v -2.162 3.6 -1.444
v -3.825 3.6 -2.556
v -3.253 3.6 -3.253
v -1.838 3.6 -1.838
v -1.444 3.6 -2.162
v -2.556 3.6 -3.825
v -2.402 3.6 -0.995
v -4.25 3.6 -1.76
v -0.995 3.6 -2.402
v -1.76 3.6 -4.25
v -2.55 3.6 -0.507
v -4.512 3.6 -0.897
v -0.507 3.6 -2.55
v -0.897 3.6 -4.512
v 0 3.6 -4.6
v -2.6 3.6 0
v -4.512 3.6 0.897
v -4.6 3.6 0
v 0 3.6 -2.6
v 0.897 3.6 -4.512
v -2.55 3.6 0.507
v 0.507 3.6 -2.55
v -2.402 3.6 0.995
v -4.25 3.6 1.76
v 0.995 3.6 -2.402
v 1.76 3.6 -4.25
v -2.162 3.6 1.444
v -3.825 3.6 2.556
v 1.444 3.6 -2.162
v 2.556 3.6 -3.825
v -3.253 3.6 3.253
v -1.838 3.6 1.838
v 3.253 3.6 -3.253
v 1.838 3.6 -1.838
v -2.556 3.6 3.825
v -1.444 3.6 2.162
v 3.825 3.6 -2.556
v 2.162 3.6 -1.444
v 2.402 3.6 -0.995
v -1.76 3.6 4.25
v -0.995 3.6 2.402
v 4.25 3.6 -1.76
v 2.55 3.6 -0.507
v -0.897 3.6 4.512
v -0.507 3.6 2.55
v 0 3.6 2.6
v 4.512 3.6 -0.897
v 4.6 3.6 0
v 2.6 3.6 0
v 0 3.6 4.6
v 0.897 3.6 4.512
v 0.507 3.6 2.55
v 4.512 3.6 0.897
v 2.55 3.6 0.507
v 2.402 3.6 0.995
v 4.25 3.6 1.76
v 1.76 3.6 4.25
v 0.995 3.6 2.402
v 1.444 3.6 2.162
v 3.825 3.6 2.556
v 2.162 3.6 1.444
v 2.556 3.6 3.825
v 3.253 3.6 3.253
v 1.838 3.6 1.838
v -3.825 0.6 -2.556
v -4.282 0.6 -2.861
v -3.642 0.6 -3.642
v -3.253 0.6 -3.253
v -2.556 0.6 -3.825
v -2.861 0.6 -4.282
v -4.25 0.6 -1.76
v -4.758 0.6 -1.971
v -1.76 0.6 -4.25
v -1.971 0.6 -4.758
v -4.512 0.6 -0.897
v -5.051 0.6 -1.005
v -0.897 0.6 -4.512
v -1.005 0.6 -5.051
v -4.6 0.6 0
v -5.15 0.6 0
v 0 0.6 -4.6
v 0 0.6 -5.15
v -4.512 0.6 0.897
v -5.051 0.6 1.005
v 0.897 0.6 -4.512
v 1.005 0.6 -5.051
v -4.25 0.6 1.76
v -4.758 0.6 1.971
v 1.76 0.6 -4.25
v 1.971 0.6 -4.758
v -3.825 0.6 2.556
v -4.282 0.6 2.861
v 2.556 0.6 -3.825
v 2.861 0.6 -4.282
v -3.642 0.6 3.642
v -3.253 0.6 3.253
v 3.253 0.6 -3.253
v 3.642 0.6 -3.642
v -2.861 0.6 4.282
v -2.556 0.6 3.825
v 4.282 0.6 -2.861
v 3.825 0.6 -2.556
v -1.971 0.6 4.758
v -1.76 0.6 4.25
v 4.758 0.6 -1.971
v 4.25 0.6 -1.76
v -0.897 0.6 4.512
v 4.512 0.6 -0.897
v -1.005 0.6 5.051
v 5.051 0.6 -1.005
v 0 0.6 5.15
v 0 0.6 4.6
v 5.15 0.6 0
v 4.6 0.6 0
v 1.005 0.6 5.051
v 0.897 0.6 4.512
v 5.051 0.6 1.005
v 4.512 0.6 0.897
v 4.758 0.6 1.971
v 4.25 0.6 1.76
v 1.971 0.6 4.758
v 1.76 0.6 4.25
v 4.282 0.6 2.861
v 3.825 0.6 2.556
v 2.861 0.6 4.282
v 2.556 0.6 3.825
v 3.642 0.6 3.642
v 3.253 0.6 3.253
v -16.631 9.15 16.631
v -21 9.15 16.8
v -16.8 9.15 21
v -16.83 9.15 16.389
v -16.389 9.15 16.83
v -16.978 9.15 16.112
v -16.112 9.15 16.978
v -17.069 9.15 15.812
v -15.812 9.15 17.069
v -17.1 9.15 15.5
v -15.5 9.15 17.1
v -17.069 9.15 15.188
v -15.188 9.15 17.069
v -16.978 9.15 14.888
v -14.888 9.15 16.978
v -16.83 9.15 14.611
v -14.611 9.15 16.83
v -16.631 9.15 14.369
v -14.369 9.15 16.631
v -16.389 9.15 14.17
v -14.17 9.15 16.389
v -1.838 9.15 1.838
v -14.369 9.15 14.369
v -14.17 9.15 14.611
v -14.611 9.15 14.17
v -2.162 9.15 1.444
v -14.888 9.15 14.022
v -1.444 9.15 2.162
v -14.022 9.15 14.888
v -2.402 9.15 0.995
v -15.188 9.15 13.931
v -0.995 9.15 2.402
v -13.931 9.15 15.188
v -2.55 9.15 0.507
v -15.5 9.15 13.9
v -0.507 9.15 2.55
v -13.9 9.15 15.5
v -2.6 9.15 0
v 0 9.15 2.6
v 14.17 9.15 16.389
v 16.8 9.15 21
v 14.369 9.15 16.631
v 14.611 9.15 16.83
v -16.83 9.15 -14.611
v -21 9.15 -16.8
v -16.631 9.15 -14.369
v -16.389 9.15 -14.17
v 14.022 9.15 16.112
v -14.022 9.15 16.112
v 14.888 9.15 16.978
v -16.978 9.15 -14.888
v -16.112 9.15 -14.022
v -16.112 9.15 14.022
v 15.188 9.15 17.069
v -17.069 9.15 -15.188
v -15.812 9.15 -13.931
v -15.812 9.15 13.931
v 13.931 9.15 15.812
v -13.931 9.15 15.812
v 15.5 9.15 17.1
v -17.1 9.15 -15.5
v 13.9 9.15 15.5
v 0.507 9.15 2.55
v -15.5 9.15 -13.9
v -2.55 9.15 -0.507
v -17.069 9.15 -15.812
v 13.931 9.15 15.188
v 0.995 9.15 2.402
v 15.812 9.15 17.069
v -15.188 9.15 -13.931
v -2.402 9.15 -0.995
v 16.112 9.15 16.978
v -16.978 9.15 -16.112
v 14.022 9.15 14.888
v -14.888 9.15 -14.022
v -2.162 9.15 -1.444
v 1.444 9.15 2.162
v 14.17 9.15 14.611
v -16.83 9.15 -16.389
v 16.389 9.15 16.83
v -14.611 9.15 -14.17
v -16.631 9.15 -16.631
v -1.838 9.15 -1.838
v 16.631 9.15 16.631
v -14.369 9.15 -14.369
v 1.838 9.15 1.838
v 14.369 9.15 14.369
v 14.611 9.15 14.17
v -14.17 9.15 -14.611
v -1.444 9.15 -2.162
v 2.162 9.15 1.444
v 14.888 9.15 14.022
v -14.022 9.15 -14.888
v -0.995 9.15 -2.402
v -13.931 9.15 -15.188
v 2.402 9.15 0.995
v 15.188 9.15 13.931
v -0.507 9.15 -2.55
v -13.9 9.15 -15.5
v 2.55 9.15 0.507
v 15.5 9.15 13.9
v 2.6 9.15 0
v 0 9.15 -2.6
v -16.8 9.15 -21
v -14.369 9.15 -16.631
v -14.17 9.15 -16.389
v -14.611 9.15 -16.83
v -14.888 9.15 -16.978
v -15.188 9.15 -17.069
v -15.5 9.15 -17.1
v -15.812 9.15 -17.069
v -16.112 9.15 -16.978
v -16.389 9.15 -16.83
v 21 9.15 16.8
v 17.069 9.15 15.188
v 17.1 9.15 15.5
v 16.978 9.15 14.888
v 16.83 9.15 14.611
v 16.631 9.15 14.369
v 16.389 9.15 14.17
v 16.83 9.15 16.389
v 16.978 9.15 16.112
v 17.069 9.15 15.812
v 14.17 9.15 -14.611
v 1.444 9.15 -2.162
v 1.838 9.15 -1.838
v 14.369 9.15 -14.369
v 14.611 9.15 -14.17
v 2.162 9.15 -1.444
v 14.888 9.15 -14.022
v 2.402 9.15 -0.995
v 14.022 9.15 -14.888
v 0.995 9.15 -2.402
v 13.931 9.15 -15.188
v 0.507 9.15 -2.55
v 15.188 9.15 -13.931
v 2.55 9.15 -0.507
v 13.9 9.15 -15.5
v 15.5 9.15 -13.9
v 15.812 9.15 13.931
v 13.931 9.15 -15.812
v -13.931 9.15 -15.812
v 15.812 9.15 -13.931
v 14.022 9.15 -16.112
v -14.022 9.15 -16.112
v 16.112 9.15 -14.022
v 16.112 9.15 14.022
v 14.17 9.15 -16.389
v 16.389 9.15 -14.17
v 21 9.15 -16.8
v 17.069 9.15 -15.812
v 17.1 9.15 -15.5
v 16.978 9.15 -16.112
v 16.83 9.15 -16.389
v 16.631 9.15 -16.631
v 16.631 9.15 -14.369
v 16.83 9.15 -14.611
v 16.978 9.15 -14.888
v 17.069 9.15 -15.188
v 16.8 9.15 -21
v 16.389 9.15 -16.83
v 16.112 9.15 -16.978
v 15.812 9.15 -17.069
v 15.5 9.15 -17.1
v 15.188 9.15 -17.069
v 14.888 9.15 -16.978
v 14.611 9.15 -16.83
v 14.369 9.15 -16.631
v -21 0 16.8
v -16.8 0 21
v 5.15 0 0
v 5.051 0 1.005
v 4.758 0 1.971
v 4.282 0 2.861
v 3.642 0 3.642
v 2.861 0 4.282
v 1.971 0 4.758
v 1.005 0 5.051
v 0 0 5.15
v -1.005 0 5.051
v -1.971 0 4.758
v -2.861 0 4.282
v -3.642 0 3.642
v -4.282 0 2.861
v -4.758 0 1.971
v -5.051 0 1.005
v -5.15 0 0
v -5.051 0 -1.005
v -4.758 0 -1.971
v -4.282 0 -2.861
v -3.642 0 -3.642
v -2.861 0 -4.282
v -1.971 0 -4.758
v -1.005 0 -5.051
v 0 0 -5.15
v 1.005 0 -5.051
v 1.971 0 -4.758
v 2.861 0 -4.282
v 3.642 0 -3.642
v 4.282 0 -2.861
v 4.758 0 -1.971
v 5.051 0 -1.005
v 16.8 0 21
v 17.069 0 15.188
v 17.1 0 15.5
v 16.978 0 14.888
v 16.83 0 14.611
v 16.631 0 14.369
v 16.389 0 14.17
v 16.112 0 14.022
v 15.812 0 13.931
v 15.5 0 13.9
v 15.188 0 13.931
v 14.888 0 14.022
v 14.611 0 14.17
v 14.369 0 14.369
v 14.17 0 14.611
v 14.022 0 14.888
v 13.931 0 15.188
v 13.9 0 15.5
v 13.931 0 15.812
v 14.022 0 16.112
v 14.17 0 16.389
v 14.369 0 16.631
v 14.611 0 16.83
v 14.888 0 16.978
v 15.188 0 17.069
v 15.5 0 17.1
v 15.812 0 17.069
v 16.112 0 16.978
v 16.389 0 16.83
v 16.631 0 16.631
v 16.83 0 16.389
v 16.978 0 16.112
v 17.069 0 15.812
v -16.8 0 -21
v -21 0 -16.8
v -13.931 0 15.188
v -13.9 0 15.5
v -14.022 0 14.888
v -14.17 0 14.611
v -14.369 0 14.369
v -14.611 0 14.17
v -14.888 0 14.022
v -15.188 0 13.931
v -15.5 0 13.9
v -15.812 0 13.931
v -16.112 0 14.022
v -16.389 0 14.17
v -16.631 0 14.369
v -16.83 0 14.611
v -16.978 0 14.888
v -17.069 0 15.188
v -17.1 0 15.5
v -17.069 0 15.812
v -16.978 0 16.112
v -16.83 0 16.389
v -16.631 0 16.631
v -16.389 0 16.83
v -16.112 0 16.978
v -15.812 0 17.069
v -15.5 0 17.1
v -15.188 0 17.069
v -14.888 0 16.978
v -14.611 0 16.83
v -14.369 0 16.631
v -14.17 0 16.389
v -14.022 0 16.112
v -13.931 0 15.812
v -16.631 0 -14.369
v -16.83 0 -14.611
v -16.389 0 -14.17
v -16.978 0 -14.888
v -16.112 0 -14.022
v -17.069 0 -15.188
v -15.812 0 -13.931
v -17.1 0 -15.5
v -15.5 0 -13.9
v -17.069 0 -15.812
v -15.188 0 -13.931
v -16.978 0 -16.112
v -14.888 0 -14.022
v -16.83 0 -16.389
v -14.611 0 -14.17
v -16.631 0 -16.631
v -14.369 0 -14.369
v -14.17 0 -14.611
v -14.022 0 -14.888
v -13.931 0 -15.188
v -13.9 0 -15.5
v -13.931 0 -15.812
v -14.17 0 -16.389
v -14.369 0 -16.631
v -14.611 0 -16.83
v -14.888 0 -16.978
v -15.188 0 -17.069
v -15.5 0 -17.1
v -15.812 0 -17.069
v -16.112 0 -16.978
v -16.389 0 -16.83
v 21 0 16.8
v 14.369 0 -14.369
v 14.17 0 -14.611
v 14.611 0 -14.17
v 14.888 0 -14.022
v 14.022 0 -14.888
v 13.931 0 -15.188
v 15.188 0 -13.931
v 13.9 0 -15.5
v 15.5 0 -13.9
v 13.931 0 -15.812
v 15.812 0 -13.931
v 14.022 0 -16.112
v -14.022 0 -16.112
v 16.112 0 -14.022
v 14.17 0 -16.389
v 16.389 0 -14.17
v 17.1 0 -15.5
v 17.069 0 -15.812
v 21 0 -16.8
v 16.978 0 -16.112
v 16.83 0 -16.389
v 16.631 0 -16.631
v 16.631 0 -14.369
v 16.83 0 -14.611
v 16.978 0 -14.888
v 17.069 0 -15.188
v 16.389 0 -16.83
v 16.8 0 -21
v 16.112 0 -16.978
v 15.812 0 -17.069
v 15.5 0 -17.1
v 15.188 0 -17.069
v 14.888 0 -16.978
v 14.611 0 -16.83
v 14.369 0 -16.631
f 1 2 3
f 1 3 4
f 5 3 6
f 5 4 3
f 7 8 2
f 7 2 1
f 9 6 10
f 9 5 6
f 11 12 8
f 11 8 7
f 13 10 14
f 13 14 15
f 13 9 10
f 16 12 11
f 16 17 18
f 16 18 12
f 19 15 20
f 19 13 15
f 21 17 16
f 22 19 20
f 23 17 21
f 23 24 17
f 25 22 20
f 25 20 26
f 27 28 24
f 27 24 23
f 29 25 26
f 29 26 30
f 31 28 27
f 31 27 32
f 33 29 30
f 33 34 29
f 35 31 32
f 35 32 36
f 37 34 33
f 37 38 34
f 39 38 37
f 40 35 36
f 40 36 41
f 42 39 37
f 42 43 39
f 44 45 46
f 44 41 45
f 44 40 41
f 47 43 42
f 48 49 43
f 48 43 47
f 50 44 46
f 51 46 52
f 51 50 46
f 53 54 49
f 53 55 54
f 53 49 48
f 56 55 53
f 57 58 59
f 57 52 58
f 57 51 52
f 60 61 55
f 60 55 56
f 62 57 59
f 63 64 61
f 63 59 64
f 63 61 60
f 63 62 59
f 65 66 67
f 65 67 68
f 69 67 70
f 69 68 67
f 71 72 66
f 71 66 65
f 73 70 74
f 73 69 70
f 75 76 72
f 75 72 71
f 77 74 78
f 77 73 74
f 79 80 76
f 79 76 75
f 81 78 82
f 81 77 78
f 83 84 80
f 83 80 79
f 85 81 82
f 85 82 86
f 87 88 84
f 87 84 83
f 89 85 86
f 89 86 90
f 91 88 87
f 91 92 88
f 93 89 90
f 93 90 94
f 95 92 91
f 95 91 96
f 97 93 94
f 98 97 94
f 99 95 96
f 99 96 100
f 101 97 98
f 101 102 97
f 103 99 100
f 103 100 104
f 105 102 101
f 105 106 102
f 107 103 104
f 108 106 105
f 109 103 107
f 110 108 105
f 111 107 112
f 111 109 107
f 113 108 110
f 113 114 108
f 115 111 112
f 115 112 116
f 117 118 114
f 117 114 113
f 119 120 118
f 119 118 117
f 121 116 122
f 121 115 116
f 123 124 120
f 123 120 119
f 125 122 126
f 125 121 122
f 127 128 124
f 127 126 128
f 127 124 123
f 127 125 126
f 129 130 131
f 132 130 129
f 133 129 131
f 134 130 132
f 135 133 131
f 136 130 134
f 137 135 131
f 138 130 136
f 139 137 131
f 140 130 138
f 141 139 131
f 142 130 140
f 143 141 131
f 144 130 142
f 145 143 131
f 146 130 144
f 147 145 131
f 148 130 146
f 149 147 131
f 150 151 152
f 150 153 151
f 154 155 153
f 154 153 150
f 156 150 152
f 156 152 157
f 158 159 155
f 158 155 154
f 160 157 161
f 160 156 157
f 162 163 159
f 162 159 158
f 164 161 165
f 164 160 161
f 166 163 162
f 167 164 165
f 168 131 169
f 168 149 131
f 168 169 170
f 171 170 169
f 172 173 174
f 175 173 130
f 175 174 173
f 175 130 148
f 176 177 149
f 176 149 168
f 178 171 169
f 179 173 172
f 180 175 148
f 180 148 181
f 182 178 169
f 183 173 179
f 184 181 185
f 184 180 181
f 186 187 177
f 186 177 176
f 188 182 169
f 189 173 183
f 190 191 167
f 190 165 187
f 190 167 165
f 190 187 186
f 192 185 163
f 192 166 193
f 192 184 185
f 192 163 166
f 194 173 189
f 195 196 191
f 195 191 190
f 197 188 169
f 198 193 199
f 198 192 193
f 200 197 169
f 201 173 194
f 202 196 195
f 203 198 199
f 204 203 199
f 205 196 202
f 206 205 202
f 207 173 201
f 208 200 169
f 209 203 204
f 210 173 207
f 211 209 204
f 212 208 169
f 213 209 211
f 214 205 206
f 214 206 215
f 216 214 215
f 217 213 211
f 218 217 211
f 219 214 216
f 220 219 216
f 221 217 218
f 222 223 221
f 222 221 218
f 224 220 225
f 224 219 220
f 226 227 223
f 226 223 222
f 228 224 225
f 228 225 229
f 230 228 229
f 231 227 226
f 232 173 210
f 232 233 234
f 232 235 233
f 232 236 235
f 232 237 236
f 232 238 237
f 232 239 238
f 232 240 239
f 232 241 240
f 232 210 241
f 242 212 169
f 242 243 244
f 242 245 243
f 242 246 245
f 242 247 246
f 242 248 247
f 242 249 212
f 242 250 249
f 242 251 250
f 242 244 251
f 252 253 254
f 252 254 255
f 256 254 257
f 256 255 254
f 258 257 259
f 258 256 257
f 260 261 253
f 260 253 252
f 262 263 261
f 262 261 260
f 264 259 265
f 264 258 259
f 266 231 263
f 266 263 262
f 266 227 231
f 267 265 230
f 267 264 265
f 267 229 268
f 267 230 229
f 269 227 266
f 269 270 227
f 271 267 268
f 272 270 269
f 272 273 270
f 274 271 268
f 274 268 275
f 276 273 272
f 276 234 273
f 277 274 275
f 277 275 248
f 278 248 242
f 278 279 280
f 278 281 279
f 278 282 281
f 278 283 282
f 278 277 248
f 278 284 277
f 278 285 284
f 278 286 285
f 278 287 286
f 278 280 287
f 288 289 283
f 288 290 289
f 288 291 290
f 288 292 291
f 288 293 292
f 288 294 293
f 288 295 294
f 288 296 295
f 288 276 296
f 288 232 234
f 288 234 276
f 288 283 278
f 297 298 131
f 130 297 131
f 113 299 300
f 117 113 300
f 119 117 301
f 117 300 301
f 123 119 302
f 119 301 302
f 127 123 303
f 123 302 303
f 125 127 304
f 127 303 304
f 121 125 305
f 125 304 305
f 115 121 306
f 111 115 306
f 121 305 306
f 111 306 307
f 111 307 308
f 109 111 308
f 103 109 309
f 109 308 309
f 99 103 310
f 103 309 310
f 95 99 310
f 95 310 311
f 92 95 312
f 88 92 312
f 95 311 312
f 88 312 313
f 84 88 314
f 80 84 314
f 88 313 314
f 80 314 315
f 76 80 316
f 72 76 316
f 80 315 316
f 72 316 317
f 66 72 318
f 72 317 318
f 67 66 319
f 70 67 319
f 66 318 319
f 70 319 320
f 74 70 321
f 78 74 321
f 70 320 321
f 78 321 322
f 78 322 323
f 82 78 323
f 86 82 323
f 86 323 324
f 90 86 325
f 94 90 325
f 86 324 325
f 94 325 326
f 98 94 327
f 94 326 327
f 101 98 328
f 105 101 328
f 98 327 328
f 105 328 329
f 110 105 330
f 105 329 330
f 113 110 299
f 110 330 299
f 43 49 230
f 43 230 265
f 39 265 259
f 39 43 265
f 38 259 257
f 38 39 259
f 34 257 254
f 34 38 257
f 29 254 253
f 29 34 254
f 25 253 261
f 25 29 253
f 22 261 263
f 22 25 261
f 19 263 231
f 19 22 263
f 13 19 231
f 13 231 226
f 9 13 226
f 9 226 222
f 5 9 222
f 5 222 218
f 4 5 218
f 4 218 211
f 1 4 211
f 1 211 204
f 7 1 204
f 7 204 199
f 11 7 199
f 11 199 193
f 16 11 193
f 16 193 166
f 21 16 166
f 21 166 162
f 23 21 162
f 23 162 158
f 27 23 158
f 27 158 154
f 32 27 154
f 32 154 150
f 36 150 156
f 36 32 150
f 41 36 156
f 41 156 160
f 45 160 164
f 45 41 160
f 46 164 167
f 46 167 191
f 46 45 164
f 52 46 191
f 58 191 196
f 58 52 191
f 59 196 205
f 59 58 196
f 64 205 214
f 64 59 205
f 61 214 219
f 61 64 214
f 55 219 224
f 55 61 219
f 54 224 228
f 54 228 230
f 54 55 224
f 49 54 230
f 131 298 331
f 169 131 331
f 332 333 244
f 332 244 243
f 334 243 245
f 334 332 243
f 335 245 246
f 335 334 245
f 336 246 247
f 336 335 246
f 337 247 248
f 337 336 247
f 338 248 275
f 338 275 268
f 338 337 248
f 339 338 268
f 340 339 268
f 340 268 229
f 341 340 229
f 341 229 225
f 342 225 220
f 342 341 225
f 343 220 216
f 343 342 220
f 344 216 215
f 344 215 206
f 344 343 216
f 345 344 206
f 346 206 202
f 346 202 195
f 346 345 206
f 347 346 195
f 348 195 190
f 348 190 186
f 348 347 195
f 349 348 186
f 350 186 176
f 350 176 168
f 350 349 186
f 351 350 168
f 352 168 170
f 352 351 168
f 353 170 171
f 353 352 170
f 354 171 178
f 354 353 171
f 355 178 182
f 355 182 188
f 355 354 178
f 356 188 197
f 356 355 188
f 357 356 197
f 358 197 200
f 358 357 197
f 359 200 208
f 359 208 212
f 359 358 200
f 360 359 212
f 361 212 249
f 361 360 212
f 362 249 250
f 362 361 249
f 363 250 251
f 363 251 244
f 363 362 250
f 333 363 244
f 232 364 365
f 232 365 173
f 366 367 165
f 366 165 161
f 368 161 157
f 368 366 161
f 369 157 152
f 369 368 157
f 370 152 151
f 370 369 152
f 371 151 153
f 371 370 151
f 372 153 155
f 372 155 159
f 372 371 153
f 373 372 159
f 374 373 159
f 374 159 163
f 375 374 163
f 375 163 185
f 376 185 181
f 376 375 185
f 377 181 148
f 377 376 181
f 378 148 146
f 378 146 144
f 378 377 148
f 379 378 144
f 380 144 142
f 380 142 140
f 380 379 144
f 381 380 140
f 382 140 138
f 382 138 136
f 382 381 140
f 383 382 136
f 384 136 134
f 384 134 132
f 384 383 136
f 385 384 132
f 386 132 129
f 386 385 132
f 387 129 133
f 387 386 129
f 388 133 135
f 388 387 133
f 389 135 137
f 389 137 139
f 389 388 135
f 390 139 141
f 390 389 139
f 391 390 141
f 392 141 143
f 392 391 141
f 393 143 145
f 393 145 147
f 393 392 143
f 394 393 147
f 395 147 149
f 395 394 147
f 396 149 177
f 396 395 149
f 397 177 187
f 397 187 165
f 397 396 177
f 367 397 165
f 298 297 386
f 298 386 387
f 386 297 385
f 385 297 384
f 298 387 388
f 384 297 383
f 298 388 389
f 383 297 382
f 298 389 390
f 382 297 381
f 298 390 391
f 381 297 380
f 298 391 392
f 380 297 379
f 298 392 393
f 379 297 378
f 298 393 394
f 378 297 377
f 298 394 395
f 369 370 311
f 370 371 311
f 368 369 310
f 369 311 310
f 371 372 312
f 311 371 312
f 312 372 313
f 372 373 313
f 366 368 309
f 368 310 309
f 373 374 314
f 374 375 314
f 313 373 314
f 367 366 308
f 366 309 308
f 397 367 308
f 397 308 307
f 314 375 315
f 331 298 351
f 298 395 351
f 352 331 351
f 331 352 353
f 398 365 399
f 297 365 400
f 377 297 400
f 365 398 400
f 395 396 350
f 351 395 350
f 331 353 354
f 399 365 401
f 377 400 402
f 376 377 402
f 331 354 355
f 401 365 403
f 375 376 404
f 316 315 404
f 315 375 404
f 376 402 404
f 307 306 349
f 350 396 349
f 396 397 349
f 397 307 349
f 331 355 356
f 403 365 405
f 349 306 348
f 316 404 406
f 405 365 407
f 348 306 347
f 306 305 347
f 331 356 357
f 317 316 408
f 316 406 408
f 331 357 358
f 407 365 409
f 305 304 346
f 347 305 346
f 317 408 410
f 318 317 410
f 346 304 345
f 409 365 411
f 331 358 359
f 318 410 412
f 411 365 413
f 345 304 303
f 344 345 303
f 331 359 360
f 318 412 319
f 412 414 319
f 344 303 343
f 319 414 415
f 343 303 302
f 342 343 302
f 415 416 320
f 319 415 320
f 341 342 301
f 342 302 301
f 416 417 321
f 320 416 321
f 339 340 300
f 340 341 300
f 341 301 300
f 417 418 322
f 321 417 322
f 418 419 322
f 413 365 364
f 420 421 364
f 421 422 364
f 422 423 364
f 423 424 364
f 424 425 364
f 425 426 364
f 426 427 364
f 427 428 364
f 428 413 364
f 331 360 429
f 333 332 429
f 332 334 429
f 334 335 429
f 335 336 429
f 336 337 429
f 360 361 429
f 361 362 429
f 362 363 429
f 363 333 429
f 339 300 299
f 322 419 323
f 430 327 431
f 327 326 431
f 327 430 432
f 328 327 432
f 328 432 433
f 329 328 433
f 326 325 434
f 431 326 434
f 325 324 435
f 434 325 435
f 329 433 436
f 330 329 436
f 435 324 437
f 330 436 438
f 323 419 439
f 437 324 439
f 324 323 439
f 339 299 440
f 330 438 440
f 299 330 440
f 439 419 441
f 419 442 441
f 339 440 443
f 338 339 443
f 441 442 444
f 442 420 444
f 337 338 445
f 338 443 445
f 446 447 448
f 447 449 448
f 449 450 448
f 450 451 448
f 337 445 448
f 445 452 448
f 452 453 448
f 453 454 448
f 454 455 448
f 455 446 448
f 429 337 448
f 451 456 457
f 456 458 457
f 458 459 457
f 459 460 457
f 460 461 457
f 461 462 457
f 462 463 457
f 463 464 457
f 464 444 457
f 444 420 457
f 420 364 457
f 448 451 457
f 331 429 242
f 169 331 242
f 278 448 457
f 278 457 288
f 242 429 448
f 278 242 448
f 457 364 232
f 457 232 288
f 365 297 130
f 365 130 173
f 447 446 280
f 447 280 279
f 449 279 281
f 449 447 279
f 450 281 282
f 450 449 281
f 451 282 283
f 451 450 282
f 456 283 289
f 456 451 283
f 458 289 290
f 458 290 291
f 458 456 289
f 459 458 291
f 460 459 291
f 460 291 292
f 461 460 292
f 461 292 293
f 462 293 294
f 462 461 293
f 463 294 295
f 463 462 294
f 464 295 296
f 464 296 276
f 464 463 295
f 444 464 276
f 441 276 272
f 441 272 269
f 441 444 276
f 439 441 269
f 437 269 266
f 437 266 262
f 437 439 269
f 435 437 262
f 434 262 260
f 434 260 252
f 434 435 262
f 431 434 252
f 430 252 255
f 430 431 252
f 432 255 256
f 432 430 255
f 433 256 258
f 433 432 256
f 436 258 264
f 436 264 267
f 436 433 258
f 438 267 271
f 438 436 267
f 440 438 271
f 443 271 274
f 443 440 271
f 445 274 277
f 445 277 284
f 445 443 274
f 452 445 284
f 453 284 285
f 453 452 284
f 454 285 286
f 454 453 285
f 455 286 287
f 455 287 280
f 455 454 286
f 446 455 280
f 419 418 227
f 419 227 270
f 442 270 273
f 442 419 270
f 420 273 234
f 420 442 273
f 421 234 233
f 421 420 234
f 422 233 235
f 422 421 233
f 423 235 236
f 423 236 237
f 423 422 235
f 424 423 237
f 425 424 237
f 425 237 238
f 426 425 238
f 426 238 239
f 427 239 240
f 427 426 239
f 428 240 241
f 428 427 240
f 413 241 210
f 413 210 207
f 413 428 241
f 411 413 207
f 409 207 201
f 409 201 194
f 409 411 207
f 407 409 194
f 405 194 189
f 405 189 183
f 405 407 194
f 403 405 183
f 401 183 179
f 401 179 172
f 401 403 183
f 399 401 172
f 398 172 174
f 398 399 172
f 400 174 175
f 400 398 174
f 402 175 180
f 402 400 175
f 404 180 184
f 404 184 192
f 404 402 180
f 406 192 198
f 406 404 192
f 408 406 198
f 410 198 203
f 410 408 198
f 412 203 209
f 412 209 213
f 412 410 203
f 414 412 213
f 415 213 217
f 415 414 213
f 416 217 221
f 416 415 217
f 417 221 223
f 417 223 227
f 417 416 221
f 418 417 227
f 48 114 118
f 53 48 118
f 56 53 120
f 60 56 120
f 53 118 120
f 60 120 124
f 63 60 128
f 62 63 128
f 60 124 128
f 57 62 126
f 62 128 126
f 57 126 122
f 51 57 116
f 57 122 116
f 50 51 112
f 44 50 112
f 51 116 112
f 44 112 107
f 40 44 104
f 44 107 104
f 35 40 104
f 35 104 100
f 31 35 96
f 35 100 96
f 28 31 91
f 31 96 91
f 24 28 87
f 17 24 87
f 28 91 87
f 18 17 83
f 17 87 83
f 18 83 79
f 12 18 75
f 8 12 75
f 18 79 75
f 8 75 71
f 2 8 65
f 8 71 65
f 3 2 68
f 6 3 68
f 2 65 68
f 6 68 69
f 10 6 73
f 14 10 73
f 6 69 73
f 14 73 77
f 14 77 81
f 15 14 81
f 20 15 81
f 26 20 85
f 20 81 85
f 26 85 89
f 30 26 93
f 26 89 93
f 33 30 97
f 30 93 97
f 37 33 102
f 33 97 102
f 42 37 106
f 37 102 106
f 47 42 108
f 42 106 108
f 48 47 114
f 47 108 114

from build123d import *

# Parameters (mm, degrees)
SKETCH_1_W          = 42
SKETCH_1_H          = 42
SKETCH_1_R          = 1.6
SKETCH_1_R_2        = 2.6
EXTRUDE_1_DEPTH     = 9.15
SKETCH_2_R          = 5.15
CUT_EXTRUDE_1_DEPTH = 0.6
CHAMFER_1_SIZE      = 4.2
SKETCH_3_R          = 4.6
CUT_EXTRUDE_2_DEPTH = 3


with BuildPart() as part:
    # 草图1 → 凸台-拉伸1 (new body)
    with BuildSketch(Plane(origin=(0, 0, 0), x_dir=(1, 0, 0), z_dir=(0, 1, 0))):
        Rectangle(SKETCH_1_W, SKETCH_1_H)
        with Locations((-15.5, 15.5)):
            Circle(SKETCH_1_R, mode=Mode.SUBTRACT)
        with Locations((15.5, 15.5)):
            Circle(SKETCH_1_R, mode=Mode.SUBTRACT)
        with Locations((15.5, -15.5)):
            Circle(SKETCH_1_R, mode=Mode.SUBTRACT)
        with Locations((-15.5, -15.5)):
            Circle(SKETCH_1_R, mode=Mode.SUBTRACT)
        Circle(SKETCH_1_R_2, mode=Mode.SUBTRACT)
    extrude(amount=EXTRUDE_1_DEPTH)

    # 草图2 → 切除-拉伸1 (cut)
    with BuildSketch(Plane.XZ):
        Circle(SKETCH_2_R)
    extrude(amount=-CUT_EXTRUDE_1_DEPTH, mode=Mode.SUBTRACT)

    # 倒角1
    chamfer_1_edges = [part.edges().sort_by_distance(p)[0] for p in [
        (21, 4.575, 21),
        (-21, 4.575, 21),
        (-21, 4.575, -21),
        (21, 4.575, -21),
    ]]
    chamfer(chamfer_1_edges, length=CHAMFER_1_SIZE)

    # 草图3 → 切除-拉伸2 (cut)
    with BuildSketch(Plane.XZ.offset(-0.6)):
        Circle(SKETCH_3_R)
    extrude(amount=-CUT_EXTRUDE_2_DEPTH, mode=Mode.SUBTRACT)


solid = part.part
